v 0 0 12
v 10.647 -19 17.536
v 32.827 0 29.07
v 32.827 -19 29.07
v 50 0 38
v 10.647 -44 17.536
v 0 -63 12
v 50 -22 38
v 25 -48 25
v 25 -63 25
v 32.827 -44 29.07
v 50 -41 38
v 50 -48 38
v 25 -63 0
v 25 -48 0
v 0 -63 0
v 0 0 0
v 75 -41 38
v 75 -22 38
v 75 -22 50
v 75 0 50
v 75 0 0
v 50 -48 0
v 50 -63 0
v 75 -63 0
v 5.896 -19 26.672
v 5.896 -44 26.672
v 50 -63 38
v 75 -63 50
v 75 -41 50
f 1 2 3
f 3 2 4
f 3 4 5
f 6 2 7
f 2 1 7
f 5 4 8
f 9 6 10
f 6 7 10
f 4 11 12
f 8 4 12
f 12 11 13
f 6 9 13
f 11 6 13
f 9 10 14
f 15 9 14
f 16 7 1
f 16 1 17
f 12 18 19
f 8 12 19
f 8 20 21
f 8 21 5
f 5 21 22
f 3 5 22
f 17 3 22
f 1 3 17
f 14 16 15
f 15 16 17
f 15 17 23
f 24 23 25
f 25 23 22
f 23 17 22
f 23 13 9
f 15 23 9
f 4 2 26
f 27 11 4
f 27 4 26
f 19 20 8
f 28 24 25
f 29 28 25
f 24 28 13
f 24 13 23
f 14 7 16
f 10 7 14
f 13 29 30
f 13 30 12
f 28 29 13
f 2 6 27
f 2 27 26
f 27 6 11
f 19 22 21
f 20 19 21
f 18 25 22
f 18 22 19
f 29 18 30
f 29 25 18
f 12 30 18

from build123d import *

# Parameters (mm, degrees)
SKETCH1_W           = 75
SKETCH1_H           = 63
BOSS_EXTRUDE1_DEPTH = 12
SKETCH2_W           = 25
SKETCH2_H           = 25
BOSS_EXTRUDE2_DEPTH = 63
CUT_EXTRUDE1_DEPTH  = 114
BOSS_EXTRUDE3_DEPTH = 63
SKETCH6_W           = 25
SKETCH6_H           = 12
CUT_EXTRUDE2_DEPTH  = 15
BOSS_EXTRUDE5_DEPTH = 48
SKETCH8_W           = 12
SKETCH8_H           = 19
CUT_EXTRUDE3_DEPTH  = 25
SKETCH9_W           = 25
SKETCH9_H           = 25
BOSS_EXTRUDE7_DEPTH = 44
CUT_EXTRUDE7_DEPTH  = 44
CUT_EXTRUDE8_DEPTH  = 44


with BuildPart() as part:
    # Sketch1 → Boss-Extrude1 (new body)
    with BuildSketch(Plane.XY):
        with Locations((37.5, -31.5)):
            Rectangle(SKETCH1_W, SKETCH1_H)
    extrude(amount=BOSS_EXTRUDE1_DEPTH)

    # Sketch2 → Boss-Extrude2 (add)
    with BuildSketch(Plane(origin=(0, -63, 0), x_dir=(-1, 0, 0), z_dir=(0, -1, 0))):
        with Locations((-12.5, -12.5)):
            Rectangle(SKETCH2_W, SKETCH2_H)
    extrude(amount=-BOSS_EXTRUDE2_DEPTH)

    # Sketch3 → Cut-Extrude1 (cut)
    with BuildSketch(Plane(origin=(0, -63, 0), x_dir=(-1, 0, 0), z_dir=(0, -1, 0))):
        Polygon((-25, -25), (0, -12), (0, -25), align=None)
    extrude(amount=-CUT_EXTRUDE1_DEPTH, mode=Mode.SUBTRACT)

    # Sketch4 → Boss-Extrude3 (add)
    with BuildSketch(Plane.XZ.offset(63)):
        Polygon((75, 50), (50, 38), (50, 0), (75, 0), align=None)
    extrude(amount=-BOSS_EXTRUDE3_DEPTH)

    # Sketch6 → Cut-Extrude2 (cut)
    with BuildSketch(Plane.XZ.offset(63)):
        with Locations((37.5, 6)):
            Rectangle(SKETCH6_W, SKETCH6_H)
    extrude(amount=-CUT_EXTRUDE2_DEPTH, mode=Mode.SUBTRACT)

    # Sketch7 → Boss-Extrude5 (add)
    with BuildSketch(Plane.XZ.offset(48)):
        Polygon((50, 38), (50, 12), (25, 12), (25, 25), align=None)
    extrude(amount=-BOSS_EXTRUDE5_DEPTH)

    # Sketch8 → Cut-Extrude3 (cut)
    with BuildSketch(Plane(origin=(75, 0, 0), x_dir=(0, 0, -1), z_dir=(1, 0, 0))):
        with Locations((-44, -31.5)):
            Rectangle(SKETCH8_W, SKETCH8_H)
    extrude(amount=-CUT_EXTRUDE3_DEPTH, mode=Mode.SUBTRACT)

    # Sketch9 → Boss-Extrude7 (add)
    with BuildSketch(Plane(origin=(-4.911838791, 0, 9.445843829), x_dir=(0.887216801234595, 0, 0.4613527366419899), z_dir=(-0.4613527366419899, 0, 0.887216801234595))):
        with Locations((30.03623284, -31.5)):
            Rectangle(SKETCH9_W, SKETCH9_H)
    extrude(amount=BOSS_EXTRUDE7_DEPTH)

    # Sketch12 → Cut-Extrude7 (cut)
    with BuildSketch(Plane(origin=(0, -44, 0), x_dir=(-1, 0, 0), z_dir=(0, -1, 0))):
        Polygon((-3.264957829, -31.731701659), (9.652918797, -56.573772094), (-12.527501233, -68.10759051), (-32.827021646, -29.070051256), align=None)
    extrude(amount=-CUT_EXTRUDE7_DEPTH, mode=Mode.SUBTRACT)

    # Sketch13 → Cut-Extrude8 (cut)
    with BuildSketch(Plane.XZ.offset(44)):
        Polygon((32.827021646, 29.070051256), (5.896218628, 26.671584738), (3.264957829, 31.731701659), align=None)
    extrude(amount=-CUT_EXTRUDE8_DEPTH, mode=Mode.SUBTRACT)


solid = part.part
